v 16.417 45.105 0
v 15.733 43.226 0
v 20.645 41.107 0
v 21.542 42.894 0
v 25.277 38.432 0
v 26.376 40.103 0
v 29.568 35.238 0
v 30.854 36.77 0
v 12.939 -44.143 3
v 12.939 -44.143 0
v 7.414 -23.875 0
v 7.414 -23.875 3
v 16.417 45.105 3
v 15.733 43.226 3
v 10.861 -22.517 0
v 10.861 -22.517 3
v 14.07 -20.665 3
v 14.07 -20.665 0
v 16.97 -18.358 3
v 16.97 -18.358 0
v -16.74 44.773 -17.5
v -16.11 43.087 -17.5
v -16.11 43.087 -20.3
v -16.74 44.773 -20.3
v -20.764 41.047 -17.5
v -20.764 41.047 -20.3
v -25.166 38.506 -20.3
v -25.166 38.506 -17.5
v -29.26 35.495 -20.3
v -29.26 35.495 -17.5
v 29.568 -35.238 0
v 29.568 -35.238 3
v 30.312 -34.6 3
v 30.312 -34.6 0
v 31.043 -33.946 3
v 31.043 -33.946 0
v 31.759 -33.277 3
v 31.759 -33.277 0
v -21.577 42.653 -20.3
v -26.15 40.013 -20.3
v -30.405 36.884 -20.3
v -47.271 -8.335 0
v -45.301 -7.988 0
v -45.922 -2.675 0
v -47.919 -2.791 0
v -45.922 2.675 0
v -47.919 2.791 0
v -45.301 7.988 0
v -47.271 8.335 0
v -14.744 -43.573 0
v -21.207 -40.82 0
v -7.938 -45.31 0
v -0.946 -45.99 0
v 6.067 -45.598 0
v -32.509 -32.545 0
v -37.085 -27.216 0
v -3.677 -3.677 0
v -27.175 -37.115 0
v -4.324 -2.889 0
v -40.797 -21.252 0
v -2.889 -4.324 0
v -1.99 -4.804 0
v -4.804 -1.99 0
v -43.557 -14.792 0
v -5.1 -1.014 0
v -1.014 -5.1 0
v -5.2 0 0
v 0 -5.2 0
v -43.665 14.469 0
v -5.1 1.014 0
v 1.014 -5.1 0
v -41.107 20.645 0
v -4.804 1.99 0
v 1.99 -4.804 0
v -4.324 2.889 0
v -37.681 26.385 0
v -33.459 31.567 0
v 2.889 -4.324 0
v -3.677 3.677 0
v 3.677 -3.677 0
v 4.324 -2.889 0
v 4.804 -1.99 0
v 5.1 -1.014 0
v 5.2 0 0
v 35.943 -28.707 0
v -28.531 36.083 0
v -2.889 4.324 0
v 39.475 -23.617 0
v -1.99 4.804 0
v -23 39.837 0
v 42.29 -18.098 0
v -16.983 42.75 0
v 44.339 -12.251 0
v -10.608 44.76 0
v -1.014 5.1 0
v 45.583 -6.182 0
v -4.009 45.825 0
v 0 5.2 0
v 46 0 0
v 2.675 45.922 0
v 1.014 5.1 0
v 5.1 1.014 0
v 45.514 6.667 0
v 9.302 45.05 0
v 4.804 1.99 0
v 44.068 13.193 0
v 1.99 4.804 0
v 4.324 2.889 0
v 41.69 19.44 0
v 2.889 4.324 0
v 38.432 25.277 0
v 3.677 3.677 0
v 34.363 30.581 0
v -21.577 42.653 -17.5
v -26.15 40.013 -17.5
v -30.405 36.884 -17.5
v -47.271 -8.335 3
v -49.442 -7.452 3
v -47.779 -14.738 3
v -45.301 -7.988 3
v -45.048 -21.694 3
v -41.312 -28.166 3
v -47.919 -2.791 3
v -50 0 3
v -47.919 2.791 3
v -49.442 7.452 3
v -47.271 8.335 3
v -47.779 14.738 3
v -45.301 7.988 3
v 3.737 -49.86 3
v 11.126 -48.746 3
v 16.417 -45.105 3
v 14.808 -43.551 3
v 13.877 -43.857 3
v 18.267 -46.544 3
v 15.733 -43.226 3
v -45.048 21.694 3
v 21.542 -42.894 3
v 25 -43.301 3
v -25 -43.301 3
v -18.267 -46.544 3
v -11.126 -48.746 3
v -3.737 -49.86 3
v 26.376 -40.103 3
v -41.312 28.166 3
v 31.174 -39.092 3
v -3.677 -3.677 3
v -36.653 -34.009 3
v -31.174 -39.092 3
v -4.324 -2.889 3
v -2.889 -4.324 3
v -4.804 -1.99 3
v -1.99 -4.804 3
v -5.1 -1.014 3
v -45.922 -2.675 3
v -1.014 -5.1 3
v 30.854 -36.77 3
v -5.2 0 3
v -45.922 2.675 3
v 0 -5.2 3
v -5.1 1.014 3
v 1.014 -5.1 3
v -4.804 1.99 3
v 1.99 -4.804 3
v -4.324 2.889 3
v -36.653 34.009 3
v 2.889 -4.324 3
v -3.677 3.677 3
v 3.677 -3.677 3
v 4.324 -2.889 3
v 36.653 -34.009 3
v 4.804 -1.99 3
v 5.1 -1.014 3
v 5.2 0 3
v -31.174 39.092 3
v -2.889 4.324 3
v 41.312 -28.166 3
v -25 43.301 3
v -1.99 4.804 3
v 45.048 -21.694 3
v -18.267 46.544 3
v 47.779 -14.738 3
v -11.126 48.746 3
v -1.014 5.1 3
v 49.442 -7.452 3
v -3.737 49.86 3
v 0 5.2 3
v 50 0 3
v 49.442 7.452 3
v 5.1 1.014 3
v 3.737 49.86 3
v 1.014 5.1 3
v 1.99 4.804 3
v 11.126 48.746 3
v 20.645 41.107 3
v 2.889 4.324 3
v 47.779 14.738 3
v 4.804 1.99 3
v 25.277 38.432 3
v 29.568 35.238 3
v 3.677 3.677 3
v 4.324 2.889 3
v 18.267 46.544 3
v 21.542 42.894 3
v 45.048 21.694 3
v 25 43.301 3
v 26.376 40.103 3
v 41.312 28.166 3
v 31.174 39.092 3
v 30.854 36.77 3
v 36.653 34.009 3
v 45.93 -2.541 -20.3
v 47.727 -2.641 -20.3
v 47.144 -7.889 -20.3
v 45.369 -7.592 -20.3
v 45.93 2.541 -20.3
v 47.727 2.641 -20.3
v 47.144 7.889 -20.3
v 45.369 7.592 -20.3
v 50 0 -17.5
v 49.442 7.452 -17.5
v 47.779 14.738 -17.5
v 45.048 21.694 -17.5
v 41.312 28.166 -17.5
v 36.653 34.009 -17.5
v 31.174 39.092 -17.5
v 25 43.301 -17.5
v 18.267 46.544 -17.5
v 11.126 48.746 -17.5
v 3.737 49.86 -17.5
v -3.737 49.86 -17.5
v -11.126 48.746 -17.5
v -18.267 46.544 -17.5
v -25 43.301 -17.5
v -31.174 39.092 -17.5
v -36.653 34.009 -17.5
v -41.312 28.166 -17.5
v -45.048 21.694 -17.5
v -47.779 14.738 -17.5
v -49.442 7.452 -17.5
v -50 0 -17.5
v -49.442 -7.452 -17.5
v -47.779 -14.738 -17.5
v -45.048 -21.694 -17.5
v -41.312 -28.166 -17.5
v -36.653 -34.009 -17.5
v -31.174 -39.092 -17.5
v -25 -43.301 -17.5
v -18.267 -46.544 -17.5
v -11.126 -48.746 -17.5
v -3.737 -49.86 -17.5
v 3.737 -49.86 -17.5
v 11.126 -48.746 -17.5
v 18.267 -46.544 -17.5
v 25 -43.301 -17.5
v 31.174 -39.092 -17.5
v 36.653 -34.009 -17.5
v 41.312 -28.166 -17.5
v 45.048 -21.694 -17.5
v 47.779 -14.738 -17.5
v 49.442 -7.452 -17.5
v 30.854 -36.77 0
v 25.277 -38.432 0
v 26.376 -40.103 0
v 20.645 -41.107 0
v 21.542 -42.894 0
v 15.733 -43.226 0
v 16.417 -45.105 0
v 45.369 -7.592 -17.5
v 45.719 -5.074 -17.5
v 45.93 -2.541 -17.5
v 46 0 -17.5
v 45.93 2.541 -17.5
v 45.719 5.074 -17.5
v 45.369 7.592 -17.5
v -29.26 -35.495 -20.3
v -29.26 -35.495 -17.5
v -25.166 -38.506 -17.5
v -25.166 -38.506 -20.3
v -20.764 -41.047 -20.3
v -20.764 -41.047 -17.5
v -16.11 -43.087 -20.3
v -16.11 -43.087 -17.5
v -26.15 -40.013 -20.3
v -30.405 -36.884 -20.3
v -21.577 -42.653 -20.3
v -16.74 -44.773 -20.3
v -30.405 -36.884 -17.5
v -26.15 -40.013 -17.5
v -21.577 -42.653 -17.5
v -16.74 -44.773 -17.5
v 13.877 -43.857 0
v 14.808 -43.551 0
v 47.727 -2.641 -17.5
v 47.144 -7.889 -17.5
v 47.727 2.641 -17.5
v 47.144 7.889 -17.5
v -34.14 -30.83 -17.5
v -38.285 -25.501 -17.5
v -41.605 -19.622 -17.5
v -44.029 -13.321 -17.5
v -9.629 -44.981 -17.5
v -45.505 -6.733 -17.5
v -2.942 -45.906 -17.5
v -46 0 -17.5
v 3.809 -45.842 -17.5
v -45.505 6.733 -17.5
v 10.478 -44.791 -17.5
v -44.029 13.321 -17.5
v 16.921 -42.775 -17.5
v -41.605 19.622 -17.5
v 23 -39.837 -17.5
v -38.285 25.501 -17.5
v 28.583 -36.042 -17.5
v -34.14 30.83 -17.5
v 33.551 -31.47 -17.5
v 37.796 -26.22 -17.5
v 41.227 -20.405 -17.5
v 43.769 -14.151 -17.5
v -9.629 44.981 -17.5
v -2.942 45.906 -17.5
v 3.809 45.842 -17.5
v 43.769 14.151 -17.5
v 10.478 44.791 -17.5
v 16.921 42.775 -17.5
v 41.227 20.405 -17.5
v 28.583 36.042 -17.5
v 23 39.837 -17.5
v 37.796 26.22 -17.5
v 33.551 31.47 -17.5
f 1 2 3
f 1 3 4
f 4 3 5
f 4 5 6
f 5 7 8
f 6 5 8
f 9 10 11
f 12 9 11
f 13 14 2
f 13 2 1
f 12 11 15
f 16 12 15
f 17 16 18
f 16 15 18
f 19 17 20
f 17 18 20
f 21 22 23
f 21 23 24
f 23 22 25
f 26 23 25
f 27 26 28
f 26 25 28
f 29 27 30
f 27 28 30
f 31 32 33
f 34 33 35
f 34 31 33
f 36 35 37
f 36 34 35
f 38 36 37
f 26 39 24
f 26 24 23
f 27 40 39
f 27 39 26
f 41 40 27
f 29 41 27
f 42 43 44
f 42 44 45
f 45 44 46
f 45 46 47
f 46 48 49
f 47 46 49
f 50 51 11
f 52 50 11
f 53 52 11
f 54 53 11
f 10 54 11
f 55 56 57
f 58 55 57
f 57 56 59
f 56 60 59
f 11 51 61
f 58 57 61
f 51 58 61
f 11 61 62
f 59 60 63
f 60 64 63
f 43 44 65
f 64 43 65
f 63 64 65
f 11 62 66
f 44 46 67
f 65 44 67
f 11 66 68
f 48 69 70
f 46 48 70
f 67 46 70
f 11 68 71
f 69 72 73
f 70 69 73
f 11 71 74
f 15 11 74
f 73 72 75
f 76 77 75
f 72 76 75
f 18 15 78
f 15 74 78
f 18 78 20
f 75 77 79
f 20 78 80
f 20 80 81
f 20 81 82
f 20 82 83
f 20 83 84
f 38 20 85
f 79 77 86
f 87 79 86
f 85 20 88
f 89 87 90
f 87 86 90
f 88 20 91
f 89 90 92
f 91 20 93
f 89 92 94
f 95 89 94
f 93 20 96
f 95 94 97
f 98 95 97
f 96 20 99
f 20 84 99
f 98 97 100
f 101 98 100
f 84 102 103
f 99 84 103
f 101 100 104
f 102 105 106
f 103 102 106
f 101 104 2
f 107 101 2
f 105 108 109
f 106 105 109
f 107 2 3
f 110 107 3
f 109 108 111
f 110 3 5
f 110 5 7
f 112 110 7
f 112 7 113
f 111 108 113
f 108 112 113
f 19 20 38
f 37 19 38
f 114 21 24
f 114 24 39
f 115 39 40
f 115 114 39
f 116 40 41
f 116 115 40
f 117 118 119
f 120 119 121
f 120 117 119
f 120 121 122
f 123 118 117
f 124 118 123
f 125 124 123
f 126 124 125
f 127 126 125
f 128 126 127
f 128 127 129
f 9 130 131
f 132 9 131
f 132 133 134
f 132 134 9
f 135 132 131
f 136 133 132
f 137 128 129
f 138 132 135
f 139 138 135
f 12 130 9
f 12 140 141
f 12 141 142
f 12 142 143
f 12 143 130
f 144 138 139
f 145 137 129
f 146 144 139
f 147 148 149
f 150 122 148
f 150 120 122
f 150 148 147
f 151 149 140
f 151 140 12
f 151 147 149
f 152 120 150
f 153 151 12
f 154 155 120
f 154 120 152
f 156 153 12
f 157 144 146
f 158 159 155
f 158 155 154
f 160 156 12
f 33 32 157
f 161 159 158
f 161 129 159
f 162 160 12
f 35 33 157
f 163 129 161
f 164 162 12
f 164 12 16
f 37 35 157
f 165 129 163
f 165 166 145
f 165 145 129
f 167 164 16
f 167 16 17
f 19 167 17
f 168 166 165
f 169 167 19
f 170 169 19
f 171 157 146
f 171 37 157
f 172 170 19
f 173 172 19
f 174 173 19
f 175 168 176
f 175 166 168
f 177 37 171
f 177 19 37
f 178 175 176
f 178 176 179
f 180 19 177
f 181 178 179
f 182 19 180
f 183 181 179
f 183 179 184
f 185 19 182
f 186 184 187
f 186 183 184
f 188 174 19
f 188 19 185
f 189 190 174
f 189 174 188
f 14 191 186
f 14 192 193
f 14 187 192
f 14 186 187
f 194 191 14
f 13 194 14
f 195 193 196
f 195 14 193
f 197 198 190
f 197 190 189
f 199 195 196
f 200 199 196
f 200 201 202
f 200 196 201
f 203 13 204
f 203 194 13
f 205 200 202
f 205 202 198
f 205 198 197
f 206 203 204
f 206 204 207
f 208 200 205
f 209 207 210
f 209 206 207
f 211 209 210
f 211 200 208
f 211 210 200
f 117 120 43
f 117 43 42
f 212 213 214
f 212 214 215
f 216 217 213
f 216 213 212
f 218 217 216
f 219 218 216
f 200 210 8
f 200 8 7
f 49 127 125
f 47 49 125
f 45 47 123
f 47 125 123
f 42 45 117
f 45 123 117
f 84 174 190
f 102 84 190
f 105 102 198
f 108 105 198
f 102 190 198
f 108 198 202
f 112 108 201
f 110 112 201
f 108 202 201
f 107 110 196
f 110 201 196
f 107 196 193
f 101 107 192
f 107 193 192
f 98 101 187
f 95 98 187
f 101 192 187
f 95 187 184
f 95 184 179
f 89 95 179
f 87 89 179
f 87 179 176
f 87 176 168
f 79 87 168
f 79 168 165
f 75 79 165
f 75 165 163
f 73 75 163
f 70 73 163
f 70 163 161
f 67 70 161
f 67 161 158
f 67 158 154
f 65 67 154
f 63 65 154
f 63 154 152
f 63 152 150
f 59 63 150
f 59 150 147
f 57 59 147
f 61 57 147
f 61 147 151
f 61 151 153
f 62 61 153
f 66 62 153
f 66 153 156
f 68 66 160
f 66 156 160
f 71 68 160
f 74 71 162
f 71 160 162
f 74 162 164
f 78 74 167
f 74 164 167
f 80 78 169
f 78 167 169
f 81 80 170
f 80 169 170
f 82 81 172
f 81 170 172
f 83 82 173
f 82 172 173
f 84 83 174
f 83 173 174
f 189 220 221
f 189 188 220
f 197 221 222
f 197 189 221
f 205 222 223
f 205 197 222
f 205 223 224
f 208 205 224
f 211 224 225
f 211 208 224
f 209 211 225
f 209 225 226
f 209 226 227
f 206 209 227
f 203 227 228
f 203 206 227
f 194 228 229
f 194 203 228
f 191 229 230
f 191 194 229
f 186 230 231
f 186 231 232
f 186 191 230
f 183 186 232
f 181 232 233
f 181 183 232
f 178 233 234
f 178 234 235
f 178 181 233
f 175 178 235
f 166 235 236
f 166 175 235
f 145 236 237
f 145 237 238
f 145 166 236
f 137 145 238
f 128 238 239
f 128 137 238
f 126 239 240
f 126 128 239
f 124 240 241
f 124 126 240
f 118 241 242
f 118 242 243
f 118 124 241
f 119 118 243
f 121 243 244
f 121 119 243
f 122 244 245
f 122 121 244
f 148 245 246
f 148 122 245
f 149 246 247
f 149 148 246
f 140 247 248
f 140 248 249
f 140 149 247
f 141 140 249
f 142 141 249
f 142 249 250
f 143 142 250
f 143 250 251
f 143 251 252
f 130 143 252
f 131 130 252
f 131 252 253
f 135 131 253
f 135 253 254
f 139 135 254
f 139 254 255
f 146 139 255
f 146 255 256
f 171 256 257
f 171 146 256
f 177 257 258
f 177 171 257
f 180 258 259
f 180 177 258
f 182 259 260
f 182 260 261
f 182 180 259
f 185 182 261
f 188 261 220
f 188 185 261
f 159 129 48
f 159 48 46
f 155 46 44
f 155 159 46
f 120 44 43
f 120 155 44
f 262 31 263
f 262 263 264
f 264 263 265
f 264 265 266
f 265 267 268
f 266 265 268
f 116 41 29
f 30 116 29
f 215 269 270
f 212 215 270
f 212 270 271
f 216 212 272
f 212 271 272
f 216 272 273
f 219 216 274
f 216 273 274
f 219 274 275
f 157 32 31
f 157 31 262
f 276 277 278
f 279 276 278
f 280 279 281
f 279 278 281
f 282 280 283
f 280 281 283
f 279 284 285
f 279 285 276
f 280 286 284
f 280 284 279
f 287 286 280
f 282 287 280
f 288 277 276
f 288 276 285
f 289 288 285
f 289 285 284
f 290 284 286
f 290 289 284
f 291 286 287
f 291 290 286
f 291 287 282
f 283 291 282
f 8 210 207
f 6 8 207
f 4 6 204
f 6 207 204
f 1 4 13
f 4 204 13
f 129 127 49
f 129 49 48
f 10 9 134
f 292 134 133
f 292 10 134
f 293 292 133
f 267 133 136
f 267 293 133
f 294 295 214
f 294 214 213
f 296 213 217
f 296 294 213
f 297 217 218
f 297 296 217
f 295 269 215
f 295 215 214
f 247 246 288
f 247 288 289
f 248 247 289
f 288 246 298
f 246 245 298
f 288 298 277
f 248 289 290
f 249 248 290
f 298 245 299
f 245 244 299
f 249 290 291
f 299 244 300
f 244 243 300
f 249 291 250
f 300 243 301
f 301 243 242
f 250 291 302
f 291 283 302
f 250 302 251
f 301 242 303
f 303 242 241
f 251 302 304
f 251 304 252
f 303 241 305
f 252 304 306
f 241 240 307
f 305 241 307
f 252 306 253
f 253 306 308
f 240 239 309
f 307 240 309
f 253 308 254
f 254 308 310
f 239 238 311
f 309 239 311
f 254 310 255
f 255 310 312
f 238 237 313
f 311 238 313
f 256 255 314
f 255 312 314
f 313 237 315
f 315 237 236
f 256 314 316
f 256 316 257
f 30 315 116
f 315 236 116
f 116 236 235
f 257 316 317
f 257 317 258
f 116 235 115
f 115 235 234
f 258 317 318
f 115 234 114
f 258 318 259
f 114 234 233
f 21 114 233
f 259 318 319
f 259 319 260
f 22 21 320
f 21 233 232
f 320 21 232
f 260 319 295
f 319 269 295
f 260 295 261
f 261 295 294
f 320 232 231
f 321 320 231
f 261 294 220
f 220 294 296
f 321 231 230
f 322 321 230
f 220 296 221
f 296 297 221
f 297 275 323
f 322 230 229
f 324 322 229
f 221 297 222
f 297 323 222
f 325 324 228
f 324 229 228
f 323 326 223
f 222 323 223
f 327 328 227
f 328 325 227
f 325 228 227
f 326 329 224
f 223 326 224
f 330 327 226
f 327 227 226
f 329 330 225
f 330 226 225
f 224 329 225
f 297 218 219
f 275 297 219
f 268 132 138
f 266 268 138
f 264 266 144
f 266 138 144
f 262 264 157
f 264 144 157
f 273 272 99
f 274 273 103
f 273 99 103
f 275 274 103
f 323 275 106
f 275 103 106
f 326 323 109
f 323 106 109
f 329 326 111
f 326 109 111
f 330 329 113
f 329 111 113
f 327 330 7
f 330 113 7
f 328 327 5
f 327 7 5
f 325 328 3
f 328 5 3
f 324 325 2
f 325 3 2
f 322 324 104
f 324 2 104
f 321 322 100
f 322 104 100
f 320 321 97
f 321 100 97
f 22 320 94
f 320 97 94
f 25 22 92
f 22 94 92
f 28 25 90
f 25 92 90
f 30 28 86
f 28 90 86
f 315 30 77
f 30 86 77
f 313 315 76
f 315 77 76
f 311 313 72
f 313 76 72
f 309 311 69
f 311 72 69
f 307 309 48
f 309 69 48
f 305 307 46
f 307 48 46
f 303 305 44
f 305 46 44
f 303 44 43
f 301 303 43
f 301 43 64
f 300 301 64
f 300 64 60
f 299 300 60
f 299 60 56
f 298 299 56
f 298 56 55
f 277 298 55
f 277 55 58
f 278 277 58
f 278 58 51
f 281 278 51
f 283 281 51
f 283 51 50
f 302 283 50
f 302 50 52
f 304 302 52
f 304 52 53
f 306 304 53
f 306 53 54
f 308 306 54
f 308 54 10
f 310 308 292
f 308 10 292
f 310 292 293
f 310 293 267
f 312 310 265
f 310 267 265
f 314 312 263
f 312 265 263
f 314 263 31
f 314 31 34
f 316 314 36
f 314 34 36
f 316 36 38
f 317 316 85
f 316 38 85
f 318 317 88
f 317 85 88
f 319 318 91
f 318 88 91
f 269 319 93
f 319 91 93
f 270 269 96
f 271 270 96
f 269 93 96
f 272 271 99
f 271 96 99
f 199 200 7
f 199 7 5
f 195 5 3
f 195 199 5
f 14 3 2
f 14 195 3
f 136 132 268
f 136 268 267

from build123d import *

# Parameters (mm, degrees)
SKETCH_R              = 50
PAD_DEPTH             = 3
SKETCH004_R           = 5.2
POCKET001_DEPTH       = 3.001
POCKET002_DEPTH       = 3.001
SKETCH006_R           = 50
SKETCH006_R_2         = 46
PAD001_DEPTH          = 17.5
POCKET003_DEPTH       = 3
POLARPATTERN001_COUNT = 3
PAD002_DEPTH          = 2.8
POLARPATTERN002_COUNT = 3


with BuildPart() as part:
    # Sketch → Pad (new body)
    with BuildSketch(Plane.XY):
        Circle(SKETCH_R)
    extrude(amount=PAD_DEPTH)

    # Sketch004 (on DatumPlane) → Pocket001 (cut, through all)
    with BuildSketch(Plane.XY.offset(3)):
        Circle(SKETCH004_R)
    extrude(amount=-POCKET001_DEPTH, mode=Mode.SUBTRACT)

    # Sketch005 → Pocket002 (cut, through all)
    with BuildSketch(Plane.XY):
        with BuildLine():
            ThreePointArc((12.9390240745, -44.1427418269), (23, -39.8371685741), (31.7592237776, -33.2768944622))
            Line((16.9700186383, -18.3580627359), (31.7592237776, -33.2768944622))
            ThreePointArc((7.4135393744, -23.8754986114), (12.5, -21.6506350946), (16.9700186383, -18.3580627359))
            Line((12.9390240745, -44.1427418269), (7.4135393744, -23.8754986114))
        make_face()
    extrude(amount=POCKET002_DEPTH, mode=Mode.SUBTRACT)

    # Sketch006 → Pad001 (join)
    with BuildSketch(Plane.XY):
        Circle(SKETCH006_R)
        Circle(SKETCH006_R_2, mode=Mode.SUBTRACT)
    extrude(amount=-PAD001_DEPTH)

    # Sketch007 (on DatumPlane) → Pocket003 (cut)
    with BuildSketch(Plane.XY.offset(3)):
        with BuildLine():
            ThreePointArc((-45.3011566386, 7.9878161727), (-46, 0), (-45.3011566386, -7.9878161727))
            Line((-45.3011566386, -7.9878161727), (-47.2707721446, -8.335112528))
            ThreePointArc((-47.2707721446, 8.335112528), (-48, 0), (-47.2707721446, -8.335112528))
            Line((-47.2707721446, 8.335112528), (-45.3011566386, 7.9878161727))
        make_face()
    pocket003 = extrude(amount=-POCKET003_DEPTH, mode=Mode.SUBTRACT)

    # PolarPattern001: Pocket003 ×3 about axis
    polarpattern001_axis = Axis((0, 0, 3), (0, 0, 1))
    for i in range(1, POLARPATTERN001_COUNT):
        add(pocket003.rotate(polarpattern001_axis, i * 360 / POLARPATTERN001_COUNT), mode=Mode.SUBTRACT)

    # Sketch008 (on DatumPlane) → Pad002 (join)
    with BuildSketch(Plane.XY.offset(-17.5)):
        with BuildLine():
            ThreePointArc((45.3691376707, -7.5921898696), (46, 0), (45.3691376707, 7.5921898696))
            Line((47.1444517535, 7.8892755601), (45.3691376707, 7.5921898696))
            ThreePointArc((47.1444517535, -7.8892755601), (47.8, 0), (47.1444517535, 7.8892755601))
            Line((45.3691376707, -7.5921898696), (47.1444517535, -7.8892755601))
        make_face()
    pad002 = extrude(amount=-PAD002_DEPTH)

    # PolarPattern002: Pad002 ×3 about axis
    polarpattern002_axis = Axis((0, 0, -17.5), (0, 0, 1))
    for i in range(1, POLARPATTERN002_COUNT):
        add(pad002.rotate(polarpattern002_axis, i * 360 / POLARPATTERN002_COUNT))


solid = part.part
